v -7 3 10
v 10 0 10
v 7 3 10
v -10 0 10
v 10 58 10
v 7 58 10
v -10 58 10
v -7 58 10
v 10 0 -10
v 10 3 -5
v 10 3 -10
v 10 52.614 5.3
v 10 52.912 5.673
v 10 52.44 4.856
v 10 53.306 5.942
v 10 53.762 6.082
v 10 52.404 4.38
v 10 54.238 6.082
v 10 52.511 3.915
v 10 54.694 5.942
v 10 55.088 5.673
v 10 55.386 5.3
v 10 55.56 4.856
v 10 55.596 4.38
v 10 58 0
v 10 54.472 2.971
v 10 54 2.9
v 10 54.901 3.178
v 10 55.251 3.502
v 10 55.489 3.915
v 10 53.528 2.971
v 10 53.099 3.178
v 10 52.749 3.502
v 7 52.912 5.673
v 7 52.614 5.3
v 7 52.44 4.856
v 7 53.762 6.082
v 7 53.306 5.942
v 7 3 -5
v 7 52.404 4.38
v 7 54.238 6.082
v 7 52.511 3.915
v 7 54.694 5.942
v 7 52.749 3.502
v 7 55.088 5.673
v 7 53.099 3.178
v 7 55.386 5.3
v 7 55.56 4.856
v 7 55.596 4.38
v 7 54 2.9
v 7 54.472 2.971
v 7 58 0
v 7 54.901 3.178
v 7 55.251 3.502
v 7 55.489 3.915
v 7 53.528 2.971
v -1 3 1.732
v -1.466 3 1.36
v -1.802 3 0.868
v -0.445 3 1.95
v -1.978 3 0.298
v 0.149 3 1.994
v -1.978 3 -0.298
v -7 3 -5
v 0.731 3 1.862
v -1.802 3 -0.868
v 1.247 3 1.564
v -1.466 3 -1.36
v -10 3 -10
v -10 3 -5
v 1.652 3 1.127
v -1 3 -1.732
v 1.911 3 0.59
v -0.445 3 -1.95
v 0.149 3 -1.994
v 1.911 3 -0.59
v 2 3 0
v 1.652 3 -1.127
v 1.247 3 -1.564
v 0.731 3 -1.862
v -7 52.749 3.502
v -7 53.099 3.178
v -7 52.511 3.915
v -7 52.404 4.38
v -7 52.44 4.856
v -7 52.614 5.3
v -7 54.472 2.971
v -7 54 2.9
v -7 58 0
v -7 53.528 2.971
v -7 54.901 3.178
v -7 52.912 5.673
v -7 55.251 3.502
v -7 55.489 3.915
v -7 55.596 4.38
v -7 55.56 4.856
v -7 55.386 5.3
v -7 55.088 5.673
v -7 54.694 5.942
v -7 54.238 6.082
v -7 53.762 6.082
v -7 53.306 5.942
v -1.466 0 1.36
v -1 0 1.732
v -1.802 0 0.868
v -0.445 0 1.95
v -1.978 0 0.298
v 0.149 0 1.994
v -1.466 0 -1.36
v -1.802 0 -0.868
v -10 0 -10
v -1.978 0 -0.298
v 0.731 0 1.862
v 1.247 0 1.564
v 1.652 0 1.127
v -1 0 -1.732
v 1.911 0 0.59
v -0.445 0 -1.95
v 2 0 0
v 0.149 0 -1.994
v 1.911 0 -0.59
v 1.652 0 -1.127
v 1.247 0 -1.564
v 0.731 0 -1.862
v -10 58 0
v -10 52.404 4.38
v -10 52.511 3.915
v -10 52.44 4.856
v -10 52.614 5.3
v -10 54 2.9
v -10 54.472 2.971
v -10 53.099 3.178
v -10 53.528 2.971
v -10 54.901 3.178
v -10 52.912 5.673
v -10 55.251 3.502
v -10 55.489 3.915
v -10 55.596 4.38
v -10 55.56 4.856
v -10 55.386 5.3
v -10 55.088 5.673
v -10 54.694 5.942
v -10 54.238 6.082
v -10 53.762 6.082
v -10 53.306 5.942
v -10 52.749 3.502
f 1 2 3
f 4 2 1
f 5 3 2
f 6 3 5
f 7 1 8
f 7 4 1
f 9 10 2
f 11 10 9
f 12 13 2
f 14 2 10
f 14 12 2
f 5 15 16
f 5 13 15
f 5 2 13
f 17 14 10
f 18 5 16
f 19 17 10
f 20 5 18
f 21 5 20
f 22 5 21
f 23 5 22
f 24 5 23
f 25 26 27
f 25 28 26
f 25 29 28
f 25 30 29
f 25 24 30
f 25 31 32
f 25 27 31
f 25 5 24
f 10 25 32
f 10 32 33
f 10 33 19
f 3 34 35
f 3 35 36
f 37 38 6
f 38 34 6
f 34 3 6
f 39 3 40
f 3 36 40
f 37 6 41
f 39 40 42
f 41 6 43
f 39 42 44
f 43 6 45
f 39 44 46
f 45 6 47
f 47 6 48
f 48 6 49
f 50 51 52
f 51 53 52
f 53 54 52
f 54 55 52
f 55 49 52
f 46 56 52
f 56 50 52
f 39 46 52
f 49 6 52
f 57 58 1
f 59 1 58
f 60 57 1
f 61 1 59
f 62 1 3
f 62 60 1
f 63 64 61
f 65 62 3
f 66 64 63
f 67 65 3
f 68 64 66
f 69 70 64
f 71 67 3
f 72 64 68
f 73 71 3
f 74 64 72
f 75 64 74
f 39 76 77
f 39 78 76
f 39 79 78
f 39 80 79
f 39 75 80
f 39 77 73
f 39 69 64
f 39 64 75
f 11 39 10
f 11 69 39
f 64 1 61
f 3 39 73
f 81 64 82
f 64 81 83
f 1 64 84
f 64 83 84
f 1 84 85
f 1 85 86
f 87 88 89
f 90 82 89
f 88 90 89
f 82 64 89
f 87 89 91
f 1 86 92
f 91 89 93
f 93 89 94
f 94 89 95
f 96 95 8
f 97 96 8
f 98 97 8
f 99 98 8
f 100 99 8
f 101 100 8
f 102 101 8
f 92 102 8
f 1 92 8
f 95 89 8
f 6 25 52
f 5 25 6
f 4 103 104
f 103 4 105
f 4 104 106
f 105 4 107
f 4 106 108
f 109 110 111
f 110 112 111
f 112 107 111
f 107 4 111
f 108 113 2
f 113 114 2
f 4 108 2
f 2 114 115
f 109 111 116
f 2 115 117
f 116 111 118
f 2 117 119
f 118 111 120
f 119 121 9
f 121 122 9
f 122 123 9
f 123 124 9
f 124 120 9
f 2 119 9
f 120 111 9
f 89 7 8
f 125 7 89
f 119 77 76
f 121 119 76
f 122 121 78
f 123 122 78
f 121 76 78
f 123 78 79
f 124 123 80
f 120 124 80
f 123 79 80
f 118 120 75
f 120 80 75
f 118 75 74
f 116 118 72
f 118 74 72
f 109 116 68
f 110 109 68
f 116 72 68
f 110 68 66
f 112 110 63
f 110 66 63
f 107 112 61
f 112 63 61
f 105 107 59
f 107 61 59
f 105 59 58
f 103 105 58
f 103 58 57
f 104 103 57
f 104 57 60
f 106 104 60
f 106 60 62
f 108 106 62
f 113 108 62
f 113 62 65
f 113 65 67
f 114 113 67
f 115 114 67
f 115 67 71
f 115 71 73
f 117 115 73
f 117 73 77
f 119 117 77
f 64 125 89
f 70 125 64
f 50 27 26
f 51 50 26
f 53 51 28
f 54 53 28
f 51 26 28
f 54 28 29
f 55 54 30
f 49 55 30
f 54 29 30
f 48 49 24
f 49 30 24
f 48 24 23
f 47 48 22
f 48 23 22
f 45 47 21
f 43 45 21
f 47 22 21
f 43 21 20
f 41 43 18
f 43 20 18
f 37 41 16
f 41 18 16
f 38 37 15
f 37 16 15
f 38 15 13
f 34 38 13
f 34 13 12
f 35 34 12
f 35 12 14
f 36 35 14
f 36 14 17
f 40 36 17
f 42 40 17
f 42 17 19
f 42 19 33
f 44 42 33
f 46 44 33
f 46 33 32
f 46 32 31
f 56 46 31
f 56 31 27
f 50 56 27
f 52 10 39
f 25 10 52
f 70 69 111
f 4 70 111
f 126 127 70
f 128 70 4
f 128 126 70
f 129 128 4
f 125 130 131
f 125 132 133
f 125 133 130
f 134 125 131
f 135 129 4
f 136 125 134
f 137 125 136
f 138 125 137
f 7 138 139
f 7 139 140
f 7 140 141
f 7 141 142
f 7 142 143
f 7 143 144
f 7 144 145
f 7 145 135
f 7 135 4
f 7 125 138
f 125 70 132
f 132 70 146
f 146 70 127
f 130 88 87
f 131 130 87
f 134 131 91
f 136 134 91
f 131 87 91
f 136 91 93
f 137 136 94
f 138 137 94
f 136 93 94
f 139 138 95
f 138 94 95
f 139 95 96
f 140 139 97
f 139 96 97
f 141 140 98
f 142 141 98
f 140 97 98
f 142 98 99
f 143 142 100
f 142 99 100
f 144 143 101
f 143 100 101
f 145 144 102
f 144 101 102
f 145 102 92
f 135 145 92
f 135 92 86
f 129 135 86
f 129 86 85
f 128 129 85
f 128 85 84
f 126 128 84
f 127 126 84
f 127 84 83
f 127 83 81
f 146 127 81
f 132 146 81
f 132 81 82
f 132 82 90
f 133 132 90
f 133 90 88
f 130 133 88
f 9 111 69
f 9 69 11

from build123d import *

# Parameters (mm, degrees)
SKETCH_1_W          = 20
SKETCH_1_H          = 20
EXTRUDE_1_DEPTH     = 3
EXTRUDE_2_DEPTH     = 3
EXTRUDE_3_DEPTH     = 3
SKETCH_6_R          = 1.6
CUT_EXTRUDE_1_DEPTH = 21
SKETCH_8_R          = 2
CUT_EXTRUDE_2_DEPTH = 4


with BuildPart() as part:
    # 草图1 → 凸台-拉伸1 (new body)
    with BuildSketch(Plane(origin=(0, 0, 0), x_dir=(1, 0, 0), z_dir=(0, 1, 0))):
        Rectangle(SKETCH_1_W, SKETCH_1_H)
    extrude(amount=EXTRUDE_1_DEPTH)

    # 草图4 → 凸台-拉伸2 (add)
    with BuildSketch(Plane.ZY.offset(10)):
        Polygon((10, 3), (10, 58), (0, 58), (-5, 3), align=None)
    extrude(amount=-EXTRUDE_2_DEPTH)

    # 草图5 → 凸台-拉伸3 (add)
    with BuildSketch(Plane(origin=(10, 0, 0), x_dir=(0, 0, -1), z_dir=(1, 0, 0))):
        Polygon((-10, 3), (5, 3), (0, 58), (-10, 58), align=None)
    extrude(amount=-EXTRUDE_3_DEPTH)

    # 草图6 → 切除-拉伸1 (cut, through all)
    with BuildSketch(Plane(origin=(10, 0, 0), x_dir=(0, 0, -1), z_dir=(1, 0, 0))):
        with Locations((-4.5, 54)):
            Circle(SKETCH_6_R)
    extrude(amount=-CUT_EXTRUDE_1_DEPTH, mode=Mode.SUBTRACT)

    # 草图8 → 切除-拉伸2 (cut, through all)
    with BuildSketch(Plane(origin=(0, 3, 0), x_dir=(1, 0, 0), z_dir=(0, 1, 0))):
        Circle(SKETCH_8_R)
    extrude(amount=-CUT_EXTRUDE_2_DEPTH, mode=Mode.SUBTRACT)


solid = part.part
